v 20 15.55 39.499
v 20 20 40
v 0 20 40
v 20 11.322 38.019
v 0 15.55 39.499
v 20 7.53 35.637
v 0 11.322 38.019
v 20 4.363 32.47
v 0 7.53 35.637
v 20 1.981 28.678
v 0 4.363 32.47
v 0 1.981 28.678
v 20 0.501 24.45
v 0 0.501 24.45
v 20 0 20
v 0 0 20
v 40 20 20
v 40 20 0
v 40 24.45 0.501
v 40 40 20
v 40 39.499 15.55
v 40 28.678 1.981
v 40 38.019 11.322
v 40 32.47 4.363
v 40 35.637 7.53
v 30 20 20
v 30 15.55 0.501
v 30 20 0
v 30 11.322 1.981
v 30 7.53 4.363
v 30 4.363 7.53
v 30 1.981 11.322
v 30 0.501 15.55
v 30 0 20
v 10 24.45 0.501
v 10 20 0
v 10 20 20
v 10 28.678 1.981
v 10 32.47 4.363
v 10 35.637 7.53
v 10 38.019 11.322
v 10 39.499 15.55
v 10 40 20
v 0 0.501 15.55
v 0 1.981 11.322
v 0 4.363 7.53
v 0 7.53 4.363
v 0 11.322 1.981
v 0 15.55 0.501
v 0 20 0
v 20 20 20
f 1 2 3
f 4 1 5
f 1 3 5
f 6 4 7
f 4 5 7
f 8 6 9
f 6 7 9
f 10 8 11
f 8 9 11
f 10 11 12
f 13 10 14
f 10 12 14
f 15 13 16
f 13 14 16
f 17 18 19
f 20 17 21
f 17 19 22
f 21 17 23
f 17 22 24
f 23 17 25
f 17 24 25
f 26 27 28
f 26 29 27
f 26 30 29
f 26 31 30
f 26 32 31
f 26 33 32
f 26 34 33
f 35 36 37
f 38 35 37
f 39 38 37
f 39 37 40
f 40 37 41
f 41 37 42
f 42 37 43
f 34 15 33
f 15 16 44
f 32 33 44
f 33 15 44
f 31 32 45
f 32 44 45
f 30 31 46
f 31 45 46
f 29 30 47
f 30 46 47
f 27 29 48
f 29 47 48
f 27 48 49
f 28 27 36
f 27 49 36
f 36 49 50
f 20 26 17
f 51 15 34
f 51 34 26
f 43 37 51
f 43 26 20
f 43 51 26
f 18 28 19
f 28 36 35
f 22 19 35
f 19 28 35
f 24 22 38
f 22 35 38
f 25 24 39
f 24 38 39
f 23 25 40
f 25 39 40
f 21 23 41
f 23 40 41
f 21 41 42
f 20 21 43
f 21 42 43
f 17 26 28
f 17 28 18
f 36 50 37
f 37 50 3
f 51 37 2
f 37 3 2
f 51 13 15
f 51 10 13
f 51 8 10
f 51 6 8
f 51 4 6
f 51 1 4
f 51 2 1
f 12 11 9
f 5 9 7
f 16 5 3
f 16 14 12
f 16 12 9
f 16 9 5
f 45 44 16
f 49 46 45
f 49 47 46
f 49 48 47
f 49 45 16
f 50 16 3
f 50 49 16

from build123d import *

# Parameters (mm, degrees)
SKETCH1_W           = 40
SKETCH1_H           = 40
BOSS_EXTRUDE1_DEPTH = 40
SKETCH2_W           = 10
SKETCH2_H           = 20
CUT_EXTRUDE1_DEPTH  = 40
SKETCH3_W           = 20
SKETCH3_H           = 20
CUT_EXTRUDE2_DEPTH  = 40
CUT_EXTRUDE3_DEPTH  = 40
SKETCH5_W           = 20
SKETCH5_H           = 20
CUT_EXTRUDE4_DEPTH  = 10
CUT_EXTRUDE6_DEPTH  = 43


with BuildPart() as part:
    # Sketch1 → Boss-Extrude1 (new body)
    with BuildSketch(Plane.XY):
        with Locations((20, 20)):
            Rectangle(SKETCH1_W, SKETCH1_H)
    extrude(amount=BOSS_EXTRUDE1_DEPTH)

    # Sketch2 → Cut-Extrude1 (cut)
    with BuildSketch(Plane.XY.offset(40)):
        with Locations((5, 30)):
            Rectangle(SKETCH2_W, SKETCH2_H)
        with Locations((35, 10)):
            Rectangle(SKETCH2_W, SKETCH2_H)
    extrude(amount=-CUT_EXTRUDE1_DEPTH, mode=Mode.SUBTRACT)

    # Sketch3 → Cut-Extrude2 (cut)
    with BuildSketch(Plane.ZY.offset(-10)):
        with Locations((30, 30)):
            Rectangle(SKETCH3_W, SKETCH3_H)
    extrude(amount=-CUT_EXTRUDE2_DEPTH, mode=Mode.SUBTRACT)

    # Sketch4 → Cut-Extrude3 (cut)
    with BuildSketch(Plane.ZY.offset(-10)):
        with BuildLine():
            Line((20, 40), (0, 40))
            Line((0, 40), (0, 20))
            ThreePointArc((0, 20), (5.857864376, 34.142135624), (20, 40))
        make_face()
    extrude(amount=-CUT_EXTRUDE3_DEPTH, mode=Mode.SUBTRACT)

    # Sketch5 → Cut-Extrude4 (cut)
    with BuildSketch(Plane(origin=(30, 0, 0), x_dir=(0, 0, -1), z_dir=(1, 0, 0))):
        with Locations((-30, 10)):
            Rectangle(SKETCH5_W, SKETCH5_H)
    extrude(amount=-CUT_EXTRUDE4_DEPTH, mode=Mode.SUBTRACT)

    # Sketch6 → Cut-Extrude6 (cut)
    with BuildSketch(Plane.ZY):
        with BuildLine():
            ThreePointArc((20, 0), (5.857864376, 5.857864376), (0, 20))
            Line((0, 20), (0, 0))
            Line((0, 0), (20, 0))
        make_face()
        with BuildLine():
            ThreePointArc((40, 20), (34.142135624, 5.857864376), (20, 0))
            Line((20, 0), (40, 0))
            Line((40, 0), (40, 20))
        make_face()
    extrude(amount=-CUT_EXTRUDE6_DEPTH, mode=Mode.SUBTRACT)


solid = part.part
